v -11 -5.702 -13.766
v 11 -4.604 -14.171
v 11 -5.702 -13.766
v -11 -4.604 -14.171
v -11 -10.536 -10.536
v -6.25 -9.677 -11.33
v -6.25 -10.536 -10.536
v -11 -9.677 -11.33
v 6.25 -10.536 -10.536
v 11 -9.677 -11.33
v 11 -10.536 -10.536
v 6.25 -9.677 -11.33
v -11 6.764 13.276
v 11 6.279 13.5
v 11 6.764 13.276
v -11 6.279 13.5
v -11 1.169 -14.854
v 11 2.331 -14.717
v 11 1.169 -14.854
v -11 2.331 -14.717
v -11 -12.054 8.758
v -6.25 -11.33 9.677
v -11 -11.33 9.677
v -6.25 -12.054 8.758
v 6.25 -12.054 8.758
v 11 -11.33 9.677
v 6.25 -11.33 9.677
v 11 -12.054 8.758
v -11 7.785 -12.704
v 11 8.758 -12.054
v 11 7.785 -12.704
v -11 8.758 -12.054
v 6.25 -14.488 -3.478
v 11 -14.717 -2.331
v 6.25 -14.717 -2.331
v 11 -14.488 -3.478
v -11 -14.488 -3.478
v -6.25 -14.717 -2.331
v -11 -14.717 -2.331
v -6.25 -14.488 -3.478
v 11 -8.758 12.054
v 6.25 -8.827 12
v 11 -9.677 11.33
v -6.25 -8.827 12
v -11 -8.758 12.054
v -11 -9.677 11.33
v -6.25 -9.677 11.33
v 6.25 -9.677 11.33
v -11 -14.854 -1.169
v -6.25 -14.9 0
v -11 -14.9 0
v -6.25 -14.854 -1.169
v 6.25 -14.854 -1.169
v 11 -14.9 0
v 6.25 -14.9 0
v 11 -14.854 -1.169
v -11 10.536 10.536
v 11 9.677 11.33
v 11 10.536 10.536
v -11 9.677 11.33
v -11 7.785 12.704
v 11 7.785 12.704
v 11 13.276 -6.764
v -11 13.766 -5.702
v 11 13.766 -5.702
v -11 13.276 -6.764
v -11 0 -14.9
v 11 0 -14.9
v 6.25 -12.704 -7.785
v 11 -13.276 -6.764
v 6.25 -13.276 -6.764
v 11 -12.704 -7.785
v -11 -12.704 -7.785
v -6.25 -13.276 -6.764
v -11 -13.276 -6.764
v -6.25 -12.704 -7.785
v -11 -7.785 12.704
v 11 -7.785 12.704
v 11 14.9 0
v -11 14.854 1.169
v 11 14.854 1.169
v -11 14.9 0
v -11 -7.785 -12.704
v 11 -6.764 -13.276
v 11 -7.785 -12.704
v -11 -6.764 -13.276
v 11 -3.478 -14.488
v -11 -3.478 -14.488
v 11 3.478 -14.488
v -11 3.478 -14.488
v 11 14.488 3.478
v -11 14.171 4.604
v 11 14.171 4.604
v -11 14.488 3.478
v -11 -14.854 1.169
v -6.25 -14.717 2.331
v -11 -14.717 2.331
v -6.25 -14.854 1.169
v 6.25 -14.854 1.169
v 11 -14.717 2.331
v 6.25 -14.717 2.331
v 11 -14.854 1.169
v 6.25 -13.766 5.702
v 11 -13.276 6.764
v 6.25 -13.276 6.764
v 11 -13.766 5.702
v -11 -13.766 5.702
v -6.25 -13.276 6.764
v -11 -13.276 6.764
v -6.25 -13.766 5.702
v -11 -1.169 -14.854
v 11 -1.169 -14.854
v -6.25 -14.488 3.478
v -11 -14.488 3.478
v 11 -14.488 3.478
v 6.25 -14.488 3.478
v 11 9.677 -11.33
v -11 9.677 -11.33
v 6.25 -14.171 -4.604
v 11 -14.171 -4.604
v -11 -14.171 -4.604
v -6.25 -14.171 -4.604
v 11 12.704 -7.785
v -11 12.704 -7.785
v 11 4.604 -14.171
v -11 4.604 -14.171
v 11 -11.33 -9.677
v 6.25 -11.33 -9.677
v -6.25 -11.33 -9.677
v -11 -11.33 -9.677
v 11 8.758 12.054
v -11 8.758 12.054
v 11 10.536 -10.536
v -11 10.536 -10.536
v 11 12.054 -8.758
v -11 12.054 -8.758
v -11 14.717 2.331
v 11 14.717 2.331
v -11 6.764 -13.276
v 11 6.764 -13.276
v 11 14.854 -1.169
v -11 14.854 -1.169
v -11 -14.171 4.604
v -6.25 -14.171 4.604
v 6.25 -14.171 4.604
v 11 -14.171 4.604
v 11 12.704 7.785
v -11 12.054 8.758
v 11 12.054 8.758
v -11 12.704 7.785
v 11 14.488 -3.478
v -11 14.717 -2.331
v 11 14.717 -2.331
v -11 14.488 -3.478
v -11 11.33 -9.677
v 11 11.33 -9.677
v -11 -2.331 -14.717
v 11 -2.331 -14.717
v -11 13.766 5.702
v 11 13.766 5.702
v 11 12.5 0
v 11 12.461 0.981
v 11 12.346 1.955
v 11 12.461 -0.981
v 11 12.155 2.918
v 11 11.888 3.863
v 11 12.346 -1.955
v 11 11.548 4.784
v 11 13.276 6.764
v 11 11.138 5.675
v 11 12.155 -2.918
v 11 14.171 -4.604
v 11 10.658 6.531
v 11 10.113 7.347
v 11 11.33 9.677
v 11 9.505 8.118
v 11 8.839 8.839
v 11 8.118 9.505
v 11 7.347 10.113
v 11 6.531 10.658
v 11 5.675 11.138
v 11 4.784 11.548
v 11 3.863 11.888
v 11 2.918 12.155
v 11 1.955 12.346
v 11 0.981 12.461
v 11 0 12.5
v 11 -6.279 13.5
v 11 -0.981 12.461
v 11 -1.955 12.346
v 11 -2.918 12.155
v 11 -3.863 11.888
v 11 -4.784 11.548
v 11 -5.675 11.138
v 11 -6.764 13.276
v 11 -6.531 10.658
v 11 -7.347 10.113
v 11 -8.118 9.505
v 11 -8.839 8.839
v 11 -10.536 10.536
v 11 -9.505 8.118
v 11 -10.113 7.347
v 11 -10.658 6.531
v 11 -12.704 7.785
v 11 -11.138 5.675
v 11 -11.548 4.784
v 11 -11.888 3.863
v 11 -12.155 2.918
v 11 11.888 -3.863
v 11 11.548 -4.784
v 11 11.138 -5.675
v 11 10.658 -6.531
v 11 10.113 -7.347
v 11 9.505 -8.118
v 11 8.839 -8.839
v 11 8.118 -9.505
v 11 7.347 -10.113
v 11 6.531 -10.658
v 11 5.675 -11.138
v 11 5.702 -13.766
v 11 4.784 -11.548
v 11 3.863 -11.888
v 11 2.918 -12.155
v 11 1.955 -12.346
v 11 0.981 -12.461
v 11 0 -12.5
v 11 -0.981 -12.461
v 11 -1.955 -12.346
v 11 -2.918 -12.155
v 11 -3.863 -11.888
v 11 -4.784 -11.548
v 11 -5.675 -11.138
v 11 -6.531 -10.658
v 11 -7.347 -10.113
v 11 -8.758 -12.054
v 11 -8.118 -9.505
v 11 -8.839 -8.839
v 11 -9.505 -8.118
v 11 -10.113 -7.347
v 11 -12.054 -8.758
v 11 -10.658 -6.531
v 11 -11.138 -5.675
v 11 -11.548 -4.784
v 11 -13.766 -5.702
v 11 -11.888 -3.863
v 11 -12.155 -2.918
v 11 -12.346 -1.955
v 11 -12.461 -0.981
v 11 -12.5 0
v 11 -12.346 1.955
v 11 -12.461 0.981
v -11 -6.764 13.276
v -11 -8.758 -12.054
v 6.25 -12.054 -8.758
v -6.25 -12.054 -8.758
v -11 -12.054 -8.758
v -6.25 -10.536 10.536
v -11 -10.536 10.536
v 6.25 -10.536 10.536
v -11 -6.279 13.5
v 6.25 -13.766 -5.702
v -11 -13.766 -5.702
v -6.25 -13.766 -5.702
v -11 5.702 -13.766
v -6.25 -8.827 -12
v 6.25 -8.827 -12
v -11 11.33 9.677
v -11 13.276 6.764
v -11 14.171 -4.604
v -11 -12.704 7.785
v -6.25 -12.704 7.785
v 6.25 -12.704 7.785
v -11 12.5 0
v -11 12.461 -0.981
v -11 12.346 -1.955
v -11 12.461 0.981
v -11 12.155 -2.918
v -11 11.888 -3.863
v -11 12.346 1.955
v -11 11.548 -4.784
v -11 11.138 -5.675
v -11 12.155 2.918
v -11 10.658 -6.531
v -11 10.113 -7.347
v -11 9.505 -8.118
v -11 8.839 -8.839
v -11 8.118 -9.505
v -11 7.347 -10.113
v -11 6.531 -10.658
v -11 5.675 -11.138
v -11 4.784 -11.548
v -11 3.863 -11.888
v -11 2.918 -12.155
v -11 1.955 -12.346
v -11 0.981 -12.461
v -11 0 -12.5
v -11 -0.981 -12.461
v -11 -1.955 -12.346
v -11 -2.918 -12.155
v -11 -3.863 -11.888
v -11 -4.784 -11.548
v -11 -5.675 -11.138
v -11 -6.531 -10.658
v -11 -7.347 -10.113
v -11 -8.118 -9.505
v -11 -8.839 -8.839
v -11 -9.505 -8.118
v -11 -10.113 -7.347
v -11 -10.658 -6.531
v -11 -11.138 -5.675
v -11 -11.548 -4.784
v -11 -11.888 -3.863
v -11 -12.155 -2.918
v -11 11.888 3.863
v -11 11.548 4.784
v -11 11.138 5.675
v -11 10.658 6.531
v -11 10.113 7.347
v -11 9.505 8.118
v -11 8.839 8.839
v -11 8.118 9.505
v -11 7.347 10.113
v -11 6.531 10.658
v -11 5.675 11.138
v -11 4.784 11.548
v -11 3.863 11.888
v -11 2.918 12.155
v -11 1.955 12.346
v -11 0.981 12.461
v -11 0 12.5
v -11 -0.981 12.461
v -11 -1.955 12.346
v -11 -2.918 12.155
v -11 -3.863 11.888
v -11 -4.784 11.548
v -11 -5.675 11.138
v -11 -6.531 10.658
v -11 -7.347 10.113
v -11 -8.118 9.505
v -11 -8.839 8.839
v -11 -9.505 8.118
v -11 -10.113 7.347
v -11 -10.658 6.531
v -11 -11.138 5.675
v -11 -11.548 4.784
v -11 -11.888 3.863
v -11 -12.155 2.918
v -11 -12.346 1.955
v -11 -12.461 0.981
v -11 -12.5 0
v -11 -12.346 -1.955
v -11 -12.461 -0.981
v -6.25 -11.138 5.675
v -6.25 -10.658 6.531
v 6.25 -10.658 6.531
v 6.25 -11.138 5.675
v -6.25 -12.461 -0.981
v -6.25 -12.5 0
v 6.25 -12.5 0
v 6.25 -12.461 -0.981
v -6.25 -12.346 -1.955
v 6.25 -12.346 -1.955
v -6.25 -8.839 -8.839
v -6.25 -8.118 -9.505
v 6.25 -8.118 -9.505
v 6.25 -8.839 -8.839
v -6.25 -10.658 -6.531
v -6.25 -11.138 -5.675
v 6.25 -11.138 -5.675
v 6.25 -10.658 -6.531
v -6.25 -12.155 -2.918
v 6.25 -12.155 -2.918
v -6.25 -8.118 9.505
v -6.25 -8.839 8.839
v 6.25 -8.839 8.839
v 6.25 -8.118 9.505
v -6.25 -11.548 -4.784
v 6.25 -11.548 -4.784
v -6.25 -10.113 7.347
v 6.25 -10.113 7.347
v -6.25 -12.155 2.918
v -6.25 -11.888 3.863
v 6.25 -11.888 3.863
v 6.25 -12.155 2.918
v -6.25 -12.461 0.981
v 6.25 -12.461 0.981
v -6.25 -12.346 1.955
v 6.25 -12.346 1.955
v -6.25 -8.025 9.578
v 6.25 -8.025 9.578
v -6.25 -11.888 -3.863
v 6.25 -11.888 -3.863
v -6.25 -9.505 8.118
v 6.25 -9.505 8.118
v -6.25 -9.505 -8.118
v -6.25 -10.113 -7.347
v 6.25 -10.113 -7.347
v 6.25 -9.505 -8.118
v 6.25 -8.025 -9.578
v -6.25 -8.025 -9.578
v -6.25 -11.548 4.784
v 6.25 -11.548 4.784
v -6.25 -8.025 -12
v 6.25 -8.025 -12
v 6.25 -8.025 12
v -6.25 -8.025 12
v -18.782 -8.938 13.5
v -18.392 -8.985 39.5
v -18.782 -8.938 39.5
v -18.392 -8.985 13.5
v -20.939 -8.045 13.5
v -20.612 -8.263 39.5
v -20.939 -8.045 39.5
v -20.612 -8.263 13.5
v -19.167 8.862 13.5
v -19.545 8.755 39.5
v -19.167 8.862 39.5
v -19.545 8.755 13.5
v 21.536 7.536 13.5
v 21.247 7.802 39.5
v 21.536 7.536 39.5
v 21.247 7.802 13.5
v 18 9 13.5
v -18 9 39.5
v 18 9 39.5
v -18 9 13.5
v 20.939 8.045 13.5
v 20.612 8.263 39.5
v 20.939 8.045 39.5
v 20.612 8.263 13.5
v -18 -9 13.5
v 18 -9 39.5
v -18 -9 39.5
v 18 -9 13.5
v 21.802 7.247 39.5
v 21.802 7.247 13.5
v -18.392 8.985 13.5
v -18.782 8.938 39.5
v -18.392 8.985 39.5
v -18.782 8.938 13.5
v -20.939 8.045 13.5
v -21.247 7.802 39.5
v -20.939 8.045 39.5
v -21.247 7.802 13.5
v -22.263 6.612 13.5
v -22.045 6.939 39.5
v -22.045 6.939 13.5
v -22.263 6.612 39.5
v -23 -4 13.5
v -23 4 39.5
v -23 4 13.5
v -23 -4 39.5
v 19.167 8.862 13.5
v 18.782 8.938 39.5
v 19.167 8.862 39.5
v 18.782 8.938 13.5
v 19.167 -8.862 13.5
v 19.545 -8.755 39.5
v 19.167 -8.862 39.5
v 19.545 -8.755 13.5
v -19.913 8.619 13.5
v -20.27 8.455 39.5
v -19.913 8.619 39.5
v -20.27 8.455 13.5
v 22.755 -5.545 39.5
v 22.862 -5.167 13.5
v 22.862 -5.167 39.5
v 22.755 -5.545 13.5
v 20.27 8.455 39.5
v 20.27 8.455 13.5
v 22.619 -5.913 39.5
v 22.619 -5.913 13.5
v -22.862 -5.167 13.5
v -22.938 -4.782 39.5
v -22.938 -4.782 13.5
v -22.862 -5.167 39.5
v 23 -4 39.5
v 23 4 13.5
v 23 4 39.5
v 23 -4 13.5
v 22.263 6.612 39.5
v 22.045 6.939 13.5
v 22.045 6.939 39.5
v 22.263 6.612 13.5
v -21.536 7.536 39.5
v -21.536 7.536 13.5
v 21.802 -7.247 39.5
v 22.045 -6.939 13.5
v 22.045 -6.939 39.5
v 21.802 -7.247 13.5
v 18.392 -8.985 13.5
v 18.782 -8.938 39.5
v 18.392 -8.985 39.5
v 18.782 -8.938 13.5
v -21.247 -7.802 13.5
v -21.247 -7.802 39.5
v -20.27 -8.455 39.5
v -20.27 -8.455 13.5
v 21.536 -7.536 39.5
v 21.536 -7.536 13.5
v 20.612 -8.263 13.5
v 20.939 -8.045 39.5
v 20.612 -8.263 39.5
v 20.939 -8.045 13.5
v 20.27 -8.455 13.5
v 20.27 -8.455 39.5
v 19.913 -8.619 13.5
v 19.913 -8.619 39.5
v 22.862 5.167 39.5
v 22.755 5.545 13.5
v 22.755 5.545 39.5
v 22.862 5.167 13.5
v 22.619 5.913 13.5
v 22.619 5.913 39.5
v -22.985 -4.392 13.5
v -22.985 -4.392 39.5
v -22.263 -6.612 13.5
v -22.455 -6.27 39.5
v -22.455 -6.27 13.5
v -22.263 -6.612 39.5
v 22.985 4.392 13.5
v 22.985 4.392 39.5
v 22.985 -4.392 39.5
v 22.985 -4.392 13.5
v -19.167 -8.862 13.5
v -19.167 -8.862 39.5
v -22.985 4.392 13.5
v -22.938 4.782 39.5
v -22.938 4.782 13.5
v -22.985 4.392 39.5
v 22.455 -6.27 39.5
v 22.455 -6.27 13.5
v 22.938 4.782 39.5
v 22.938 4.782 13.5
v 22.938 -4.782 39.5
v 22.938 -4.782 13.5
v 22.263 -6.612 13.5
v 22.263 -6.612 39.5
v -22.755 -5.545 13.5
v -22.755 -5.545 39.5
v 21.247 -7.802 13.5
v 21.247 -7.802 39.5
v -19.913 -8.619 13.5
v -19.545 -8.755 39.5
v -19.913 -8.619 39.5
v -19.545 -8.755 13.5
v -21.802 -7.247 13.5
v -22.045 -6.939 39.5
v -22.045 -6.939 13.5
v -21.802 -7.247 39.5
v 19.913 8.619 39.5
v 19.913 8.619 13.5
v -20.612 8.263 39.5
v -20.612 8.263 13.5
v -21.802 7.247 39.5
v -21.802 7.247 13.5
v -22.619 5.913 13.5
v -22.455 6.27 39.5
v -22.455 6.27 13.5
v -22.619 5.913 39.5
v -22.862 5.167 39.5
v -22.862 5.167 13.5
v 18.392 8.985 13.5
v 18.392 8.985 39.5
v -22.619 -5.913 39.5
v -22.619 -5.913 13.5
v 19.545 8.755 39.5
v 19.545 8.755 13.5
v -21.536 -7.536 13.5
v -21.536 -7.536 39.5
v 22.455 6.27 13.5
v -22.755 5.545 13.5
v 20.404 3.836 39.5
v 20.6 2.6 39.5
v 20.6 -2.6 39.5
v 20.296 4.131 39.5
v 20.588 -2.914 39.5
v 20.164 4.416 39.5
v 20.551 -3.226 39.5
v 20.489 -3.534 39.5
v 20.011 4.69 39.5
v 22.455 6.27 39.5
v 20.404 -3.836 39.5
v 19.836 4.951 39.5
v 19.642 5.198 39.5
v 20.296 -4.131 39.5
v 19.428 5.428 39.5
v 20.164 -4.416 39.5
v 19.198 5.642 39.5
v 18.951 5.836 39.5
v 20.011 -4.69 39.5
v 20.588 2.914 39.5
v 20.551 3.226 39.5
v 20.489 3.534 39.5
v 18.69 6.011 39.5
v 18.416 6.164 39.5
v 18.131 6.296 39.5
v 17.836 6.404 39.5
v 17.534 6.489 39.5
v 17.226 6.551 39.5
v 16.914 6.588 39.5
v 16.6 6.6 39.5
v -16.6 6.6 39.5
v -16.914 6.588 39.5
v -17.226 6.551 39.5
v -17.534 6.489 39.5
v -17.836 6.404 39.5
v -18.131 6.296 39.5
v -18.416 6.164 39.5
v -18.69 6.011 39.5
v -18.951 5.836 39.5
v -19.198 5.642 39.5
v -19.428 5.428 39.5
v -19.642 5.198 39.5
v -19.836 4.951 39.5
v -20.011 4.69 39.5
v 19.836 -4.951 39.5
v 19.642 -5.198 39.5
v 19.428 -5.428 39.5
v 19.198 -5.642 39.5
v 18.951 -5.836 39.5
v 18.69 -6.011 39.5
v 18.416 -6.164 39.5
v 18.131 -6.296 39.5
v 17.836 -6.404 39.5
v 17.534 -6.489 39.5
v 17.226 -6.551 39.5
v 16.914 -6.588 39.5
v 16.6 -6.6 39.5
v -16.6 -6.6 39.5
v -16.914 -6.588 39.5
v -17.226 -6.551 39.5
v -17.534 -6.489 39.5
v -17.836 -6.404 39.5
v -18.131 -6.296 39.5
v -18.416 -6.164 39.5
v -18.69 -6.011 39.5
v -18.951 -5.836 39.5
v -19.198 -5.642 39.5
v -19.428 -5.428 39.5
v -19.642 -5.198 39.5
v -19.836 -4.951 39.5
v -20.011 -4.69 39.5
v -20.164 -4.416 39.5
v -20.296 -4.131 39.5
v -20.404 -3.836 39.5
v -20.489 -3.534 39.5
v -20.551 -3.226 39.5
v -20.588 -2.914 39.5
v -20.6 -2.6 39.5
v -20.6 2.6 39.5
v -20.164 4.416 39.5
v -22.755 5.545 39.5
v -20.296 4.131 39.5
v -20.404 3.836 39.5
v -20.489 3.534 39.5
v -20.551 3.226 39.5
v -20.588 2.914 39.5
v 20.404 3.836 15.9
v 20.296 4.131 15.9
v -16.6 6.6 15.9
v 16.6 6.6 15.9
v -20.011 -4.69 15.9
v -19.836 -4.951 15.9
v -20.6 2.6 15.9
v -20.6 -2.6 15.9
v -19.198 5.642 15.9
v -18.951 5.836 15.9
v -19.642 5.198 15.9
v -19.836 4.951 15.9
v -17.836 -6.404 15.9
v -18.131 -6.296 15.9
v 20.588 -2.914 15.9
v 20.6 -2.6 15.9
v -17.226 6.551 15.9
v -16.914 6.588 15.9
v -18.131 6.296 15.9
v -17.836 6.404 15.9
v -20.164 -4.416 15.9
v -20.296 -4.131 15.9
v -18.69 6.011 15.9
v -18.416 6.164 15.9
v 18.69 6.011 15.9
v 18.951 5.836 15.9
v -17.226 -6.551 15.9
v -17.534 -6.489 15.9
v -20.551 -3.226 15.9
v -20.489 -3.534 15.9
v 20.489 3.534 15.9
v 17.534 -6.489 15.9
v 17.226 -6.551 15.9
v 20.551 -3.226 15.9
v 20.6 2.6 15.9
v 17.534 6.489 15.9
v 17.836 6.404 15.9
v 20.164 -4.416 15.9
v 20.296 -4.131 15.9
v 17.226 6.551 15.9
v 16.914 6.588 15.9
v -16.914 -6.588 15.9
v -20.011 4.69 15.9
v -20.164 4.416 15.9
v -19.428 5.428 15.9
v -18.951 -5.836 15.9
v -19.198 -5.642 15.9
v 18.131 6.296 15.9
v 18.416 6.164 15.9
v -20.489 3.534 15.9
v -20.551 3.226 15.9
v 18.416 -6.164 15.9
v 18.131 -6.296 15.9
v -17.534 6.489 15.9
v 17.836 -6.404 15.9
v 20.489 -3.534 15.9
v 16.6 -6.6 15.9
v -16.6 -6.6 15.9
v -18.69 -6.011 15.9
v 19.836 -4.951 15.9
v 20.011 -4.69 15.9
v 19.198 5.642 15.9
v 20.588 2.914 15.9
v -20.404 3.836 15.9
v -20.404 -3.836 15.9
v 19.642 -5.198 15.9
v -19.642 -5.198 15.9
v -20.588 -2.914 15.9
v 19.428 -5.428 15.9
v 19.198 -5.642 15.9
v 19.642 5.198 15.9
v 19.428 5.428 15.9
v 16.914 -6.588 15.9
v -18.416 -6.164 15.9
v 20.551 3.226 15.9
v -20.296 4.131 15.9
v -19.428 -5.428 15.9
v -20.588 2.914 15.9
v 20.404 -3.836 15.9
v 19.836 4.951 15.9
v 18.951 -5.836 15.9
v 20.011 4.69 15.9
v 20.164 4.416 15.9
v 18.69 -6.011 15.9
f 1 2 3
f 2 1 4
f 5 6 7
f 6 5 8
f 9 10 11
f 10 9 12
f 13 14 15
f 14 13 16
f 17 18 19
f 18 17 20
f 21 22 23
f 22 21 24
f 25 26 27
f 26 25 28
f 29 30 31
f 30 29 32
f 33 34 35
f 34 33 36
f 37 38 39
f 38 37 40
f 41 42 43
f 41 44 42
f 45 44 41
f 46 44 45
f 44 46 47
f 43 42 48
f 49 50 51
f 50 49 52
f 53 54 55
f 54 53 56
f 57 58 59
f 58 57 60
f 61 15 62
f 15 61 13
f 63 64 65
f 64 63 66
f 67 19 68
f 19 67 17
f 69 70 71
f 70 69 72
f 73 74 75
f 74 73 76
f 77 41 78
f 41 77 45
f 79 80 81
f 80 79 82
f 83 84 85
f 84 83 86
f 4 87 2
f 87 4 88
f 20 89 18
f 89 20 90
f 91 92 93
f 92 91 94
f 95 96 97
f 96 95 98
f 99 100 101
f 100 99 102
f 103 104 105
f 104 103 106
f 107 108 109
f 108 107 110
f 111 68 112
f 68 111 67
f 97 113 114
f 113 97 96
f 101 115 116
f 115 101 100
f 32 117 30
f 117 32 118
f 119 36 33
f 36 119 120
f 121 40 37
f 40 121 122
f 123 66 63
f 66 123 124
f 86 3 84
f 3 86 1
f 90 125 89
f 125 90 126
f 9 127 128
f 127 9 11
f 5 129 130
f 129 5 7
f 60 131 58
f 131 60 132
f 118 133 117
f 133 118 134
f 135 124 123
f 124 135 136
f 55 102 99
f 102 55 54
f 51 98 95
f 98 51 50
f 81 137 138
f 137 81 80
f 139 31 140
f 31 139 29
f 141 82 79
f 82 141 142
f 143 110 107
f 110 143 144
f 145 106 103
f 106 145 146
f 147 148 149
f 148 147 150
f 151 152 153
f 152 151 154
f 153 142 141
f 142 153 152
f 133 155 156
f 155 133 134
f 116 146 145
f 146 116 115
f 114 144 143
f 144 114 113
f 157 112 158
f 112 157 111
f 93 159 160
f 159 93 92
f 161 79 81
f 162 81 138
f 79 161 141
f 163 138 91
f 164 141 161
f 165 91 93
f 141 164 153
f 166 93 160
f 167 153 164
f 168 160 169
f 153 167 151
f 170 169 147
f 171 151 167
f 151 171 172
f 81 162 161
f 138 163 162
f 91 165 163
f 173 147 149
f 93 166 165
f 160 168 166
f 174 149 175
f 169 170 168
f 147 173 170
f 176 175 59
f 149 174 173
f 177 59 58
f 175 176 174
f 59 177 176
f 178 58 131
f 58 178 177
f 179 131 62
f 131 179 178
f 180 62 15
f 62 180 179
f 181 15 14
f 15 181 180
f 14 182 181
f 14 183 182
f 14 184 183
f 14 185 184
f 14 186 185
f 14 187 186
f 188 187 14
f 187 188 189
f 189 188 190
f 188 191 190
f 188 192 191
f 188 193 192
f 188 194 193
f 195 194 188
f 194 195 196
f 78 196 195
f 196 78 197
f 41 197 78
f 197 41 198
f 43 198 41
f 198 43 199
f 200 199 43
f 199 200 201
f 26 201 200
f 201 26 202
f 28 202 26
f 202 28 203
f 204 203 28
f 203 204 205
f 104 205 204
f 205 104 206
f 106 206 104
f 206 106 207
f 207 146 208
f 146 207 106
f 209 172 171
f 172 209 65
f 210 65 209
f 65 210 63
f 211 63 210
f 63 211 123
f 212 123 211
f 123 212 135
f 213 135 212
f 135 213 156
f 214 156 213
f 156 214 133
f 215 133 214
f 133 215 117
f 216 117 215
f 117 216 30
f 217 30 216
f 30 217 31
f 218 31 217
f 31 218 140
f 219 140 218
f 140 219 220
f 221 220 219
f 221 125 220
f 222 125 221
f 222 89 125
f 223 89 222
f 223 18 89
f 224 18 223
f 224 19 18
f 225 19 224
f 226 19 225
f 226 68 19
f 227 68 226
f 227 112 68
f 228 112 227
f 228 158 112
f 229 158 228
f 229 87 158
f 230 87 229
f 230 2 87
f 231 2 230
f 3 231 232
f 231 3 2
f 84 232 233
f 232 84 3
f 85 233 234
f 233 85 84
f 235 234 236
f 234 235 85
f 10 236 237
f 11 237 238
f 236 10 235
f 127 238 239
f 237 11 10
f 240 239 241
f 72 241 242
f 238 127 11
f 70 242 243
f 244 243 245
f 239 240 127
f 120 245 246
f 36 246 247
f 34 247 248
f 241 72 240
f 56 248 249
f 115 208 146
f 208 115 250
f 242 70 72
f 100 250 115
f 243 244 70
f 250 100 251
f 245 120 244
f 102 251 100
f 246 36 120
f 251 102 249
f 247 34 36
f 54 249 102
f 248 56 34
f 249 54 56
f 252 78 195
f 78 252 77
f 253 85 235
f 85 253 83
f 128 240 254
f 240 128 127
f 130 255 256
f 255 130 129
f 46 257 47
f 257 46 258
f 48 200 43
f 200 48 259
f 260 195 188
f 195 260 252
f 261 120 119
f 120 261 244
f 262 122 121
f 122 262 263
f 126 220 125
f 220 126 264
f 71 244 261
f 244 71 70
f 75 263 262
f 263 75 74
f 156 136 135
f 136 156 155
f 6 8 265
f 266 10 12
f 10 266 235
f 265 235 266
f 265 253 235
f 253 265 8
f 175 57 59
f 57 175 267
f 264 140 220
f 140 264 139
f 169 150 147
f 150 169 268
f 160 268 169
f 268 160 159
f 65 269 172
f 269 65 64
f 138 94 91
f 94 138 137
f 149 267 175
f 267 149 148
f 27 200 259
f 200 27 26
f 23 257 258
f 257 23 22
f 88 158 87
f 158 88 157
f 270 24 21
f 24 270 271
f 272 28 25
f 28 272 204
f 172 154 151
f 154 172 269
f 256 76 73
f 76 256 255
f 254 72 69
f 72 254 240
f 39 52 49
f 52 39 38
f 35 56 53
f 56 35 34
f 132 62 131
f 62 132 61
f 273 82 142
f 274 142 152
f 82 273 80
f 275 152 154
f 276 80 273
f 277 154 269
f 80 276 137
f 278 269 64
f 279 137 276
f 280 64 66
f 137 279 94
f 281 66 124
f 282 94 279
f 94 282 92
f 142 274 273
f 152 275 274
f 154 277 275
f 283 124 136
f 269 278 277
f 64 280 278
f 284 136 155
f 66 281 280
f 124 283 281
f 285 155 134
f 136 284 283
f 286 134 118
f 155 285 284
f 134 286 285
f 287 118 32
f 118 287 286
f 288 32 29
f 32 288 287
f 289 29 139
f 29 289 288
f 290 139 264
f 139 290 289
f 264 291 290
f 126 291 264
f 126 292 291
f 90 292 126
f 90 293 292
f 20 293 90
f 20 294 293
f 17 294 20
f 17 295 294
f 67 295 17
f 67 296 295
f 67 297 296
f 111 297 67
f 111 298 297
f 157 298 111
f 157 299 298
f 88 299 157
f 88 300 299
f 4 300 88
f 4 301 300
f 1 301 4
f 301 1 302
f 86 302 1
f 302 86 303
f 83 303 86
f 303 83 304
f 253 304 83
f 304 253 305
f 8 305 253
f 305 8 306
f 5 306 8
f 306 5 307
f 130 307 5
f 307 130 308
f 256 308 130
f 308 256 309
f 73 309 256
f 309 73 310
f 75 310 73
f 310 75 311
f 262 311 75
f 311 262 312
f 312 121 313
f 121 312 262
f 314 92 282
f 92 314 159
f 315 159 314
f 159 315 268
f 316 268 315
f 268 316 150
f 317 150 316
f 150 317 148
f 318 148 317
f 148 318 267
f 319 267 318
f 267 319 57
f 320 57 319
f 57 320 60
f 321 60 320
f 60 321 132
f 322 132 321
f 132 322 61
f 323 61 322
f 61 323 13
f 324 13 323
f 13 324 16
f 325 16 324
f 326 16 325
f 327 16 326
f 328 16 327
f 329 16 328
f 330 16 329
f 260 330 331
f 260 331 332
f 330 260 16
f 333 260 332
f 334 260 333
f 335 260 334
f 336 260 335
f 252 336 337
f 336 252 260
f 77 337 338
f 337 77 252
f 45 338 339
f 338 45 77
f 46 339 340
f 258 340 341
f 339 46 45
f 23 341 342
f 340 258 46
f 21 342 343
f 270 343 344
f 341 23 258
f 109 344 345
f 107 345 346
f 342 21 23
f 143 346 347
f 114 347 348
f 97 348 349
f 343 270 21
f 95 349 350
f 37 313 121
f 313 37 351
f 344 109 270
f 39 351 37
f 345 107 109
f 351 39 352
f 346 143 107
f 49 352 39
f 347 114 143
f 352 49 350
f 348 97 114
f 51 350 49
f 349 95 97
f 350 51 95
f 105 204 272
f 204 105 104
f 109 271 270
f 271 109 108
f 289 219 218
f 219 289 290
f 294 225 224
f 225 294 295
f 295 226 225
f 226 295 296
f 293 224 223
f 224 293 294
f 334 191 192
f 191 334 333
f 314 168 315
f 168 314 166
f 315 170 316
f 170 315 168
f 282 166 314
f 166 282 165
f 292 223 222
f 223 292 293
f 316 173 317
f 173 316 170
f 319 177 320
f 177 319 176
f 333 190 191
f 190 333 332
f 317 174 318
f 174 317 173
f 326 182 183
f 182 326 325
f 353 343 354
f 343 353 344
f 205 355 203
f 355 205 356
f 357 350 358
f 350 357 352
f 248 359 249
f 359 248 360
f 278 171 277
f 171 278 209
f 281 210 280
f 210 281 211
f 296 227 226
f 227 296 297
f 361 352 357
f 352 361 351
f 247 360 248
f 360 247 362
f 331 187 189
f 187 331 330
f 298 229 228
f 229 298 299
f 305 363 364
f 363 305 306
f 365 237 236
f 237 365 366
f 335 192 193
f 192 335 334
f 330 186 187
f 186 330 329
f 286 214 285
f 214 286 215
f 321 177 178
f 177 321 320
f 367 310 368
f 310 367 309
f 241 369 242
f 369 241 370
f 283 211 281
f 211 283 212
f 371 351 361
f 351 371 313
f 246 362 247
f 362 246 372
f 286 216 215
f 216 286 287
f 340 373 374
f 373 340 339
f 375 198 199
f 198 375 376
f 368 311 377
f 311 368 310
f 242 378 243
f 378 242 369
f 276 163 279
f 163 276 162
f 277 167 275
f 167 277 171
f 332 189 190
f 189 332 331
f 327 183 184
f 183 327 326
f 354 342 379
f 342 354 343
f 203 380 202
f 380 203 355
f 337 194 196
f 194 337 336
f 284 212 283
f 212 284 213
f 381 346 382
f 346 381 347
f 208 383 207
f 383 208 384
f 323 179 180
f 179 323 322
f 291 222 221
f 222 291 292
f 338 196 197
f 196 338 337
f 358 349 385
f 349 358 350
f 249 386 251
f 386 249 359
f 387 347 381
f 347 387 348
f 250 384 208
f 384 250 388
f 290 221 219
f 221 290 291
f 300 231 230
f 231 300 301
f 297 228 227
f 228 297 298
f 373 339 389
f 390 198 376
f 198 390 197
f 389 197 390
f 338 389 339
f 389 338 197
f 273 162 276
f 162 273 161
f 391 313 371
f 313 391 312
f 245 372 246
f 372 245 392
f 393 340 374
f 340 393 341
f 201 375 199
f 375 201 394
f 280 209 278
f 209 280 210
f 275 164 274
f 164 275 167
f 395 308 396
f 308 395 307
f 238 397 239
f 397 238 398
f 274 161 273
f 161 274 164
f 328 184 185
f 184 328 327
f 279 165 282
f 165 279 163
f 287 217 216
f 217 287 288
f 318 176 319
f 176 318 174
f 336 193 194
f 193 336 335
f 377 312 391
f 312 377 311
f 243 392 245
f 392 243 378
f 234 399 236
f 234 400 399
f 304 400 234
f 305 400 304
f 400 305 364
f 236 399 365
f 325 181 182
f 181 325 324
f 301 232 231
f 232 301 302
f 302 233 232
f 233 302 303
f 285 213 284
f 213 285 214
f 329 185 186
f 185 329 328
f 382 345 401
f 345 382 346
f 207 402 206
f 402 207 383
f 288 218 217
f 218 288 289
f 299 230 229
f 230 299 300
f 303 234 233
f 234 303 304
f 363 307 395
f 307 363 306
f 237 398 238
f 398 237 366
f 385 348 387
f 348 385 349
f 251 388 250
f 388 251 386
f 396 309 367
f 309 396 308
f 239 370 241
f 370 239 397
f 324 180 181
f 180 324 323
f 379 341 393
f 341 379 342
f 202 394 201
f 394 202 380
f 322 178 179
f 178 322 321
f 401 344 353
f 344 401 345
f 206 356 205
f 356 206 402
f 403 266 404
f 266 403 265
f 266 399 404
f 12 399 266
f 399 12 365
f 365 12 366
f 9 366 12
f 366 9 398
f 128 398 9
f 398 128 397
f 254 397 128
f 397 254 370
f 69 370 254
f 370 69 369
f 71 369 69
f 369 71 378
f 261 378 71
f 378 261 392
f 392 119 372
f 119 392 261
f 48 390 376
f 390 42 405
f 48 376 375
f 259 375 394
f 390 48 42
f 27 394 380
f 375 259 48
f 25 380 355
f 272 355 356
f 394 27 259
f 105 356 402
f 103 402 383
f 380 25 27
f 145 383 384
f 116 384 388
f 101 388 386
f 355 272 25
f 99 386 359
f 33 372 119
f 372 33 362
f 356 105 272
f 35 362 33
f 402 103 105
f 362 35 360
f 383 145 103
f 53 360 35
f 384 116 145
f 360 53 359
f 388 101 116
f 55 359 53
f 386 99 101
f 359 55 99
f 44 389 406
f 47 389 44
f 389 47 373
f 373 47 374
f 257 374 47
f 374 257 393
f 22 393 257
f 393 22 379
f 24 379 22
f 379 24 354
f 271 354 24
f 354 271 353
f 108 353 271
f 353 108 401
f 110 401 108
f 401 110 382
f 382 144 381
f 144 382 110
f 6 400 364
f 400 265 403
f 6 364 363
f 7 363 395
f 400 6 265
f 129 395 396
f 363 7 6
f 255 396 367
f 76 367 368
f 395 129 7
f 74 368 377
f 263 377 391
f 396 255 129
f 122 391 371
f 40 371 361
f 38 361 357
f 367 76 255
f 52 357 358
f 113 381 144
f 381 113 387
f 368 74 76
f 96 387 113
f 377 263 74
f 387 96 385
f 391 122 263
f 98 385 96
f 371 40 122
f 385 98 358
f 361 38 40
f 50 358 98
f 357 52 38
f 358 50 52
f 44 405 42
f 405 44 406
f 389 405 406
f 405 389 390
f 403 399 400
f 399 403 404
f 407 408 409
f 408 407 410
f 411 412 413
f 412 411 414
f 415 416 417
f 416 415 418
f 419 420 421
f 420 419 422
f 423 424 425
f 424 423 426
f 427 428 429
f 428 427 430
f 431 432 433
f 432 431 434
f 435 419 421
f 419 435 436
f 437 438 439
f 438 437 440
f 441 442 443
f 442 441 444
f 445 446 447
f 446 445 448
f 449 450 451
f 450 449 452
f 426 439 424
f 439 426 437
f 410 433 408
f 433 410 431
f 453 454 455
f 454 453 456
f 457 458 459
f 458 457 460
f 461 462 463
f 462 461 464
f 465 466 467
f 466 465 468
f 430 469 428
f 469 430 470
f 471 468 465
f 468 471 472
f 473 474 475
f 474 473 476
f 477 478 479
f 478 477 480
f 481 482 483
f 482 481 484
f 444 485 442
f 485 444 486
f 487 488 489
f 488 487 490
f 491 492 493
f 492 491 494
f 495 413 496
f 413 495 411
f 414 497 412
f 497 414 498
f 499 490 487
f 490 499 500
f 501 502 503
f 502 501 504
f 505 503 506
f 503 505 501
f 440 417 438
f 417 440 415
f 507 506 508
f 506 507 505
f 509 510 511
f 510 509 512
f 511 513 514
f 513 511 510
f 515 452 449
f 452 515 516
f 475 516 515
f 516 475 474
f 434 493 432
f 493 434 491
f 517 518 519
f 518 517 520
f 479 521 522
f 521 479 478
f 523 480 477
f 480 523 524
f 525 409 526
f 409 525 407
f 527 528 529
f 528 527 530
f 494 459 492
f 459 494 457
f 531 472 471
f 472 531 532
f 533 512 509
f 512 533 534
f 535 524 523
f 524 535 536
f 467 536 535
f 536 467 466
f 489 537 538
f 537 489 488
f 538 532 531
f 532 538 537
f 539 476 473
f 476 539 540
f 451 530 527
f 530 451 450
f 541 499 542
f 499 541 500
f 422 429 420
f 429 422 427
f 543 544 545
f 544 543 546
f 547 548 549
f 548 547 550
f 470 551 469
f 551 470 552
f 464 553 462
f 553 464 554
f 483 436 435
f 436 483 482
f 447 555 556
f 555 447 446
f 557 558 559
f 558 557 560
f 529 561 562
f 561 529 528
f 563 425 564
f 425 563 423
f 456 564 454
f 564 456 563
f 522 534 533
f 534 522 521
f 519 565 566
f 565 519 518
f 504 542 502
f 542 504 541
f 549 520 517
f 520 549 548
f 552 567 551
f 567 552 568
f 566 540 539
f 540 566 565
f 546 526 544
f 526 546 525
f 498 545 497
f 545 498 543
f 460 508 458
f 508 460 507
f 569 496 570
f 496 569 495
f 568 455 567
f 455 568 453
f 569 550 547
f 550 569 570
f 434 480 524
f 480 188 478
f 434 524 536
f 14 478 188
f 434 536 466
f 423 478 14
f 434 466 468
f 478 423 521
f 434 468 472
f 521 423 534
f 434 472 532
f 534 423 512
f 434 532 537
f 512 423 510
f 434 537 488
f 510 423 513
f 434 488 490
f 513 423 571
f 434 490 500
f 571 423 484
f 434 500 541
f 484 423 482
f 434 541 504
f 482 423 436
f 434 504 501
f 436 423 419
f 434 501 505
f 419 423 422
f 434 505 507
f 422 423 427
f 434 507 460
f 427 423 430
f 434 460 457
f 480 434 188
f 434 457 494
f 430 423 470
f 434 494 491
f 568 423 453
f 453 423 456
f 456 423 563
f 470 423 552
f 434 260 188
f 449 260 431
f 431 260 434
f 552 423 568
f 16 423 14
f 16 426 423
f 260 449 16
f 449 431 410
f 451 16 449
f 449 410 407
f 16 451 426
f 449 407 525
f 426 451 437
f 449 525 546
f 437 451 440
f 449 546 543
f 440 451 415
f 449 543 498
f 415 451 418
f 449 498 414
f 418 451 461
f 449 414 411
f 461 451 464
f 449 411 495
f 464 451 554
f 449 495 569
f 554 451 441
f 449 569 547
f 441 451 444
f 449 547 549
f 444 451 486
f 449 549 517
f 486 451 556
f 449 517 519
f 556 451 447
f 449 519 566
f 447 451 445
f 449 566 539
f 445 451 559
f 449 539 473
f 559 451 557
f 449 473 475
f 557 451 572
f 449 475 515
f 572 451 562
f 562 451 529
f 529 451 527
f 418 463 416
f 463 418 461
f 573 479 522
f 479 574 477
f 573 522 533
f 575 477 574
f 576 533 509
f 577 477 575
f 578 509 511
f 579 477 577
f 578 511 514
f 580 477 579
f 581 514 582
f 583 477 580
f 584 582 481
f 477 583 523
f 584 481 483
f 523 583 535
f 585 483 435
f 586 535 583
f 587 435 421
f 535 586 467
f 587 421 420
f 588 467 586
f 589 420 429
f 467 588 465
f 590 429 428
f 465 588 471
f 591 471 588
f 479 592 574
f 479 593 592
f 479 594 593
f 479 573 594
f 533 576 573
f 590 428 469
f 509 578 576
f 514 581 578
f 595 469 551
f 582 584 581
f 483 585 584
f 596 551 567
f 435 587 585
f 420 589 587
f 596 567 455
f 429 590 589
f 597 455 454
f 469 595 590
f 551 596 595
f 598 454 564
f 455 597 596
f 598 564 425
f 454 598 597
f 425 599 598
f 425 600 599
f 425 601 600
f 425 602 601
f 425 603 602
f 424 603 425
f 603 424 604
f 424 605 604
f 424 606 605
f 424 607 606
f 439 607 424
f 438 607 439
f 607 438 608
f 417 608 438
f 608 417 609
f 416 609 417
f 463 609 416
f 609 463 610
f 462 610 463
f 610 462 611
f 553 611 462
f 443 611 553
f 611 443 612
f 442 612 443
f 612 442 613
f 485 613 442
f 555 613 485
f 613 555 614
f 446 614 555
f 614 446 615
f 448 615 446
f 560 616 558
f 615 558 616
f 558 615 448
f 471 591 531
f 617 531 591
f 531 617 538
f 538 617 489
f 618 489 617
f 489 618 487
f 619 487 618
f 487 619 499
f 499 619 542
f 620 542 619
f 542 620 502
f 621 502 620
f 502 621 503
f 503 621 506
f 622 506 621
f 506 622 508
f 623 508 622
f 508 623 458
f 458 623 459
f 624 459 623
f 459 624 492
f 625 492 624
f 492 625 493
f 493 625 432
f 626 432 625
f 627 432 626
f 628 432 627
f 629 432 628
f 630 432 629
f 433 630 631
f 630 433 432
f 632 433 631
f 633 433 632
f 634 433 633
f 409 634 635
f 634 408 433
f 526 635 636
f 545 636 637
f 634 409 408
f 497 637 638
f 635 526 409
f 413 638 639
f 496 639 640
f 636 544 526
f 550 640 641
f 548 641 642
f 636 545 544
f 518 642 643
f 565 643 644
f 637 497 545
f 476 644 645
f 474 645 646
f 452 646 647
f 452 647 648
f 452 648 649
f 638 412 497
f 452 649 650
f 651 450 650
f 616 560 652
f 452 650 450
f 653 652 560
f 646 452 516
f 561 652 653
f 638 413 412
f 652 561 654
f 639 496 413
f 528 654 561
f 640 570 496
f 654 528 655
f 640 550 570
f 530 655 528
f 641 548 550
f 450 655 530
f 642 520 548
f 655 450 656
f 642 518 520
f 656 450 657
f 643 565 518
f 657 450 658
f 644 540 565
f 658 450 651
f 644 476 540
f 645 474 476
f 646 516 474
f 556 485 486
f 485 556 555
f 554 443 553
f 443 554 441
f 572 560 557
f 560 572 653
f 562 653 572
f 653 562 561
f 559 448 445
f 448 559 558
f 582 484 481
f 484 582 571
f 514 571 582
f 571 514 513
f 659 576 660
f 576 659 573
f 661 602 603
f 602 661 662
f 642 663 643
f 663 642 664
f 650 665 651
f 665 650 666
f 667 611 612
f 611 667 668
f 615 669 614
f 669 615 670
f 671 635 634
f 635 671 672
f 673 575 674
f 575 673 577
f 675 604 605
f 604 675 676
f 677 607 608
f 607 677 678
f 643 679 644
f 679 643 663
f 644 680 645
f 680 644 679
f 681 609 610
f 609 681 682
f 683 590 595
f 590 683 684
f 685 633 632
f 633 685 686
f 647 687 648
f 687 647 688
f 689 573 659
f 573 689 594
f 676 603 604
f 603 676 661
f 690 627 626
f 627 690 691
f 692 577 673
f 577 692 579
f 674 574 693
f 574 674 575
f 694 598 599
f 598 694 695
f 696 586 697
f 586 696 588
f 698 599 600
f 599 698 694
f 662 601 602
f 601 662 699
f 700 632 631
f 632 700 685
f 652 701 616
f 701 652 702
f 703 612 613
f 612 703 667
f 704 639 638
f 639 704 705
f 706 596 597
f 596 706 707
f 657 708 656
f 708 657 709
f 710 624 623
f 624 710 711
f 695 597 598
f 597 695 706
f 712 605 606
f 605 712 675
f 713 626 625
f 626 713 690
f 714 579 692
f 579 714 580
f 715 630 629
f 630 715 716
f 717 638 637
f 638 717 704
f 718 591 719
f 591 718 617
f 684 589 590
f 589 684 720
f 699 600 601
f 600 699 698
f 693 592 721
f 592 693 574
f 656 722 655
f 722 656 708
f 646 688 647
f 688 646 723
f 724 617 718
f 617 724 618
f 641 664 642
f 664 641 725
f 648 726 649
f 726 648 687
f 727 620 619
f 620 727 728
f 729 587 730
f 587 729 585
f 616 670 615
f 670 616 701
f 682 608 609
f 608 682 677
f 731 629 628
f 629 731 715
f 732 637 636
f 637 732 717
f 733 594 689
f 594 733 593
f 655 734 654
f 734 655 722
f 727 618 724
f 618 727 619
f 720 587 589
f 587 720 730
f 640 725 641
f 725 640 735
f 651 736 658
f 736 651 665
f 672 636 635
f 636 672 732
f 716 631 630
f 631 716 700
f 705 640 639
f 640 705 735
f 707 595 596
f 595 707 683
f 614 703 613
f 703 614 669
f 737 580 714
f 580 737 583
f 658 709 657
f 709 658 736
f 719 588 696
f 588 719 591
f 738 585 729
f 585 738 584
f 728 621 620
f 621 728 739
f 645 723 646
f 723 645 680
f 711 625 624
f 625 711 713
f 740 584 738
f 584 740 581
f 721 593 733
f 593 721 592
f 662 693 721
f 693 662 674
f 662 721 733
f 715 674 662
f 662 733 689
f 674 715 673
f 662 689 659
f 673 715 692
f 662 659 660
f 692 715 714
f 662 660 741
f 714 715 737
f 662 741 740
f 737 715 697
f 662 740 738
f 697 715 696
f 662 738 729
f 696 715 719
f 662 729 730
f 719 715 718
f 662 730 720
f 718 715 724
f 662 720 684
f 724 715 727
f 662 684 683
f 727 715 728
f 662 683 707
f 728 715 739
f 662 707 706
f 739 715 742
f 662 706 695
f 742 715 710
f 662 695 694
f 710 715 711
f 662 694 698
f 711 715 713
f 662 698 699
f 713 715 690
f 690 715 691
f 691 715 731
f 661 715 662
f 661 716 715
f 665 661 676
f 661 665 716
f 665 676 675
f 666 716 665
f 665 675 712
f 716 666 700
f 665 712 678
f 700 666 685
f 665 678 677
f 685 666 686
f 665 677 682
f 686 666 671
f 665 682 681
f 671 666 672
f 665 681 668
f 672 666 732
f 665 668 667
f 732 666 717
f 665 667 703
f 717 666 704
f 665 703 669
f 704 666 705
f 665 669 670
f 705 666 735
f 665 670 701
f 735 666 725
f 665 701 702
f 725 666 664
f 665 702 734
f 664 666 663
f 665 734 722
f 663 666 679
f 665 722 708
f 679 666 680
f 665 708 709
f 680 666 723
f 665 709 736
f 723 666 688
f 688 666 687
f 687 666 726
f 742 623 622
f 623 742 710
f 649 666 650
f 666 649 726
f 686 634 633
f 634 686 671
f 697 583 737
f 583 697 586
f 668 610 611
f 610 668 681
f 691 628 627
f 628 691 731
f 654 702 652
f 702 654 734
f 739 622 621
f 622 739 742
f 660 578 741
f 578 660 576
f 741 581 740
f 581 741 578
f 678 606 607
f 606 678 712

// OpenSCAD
// EchoDrop - clip-on acoustic leak sensor (parametric 3D model, starter)
//
// How to get a detailed 3D model/render from this file:
//   1. Install OpenSCAD (free, openscad.org) and open this file.
//   2. Press F6 to render, then File > Export > Export as STL.
//   3. Open the STL in Blender (free) for a full material/lighting render,
//      or in Tinkercad / Fusion 360 to keep editing it.
// All sizes are in millimetres. Change the values below to reshape it.

$fn = 80;

pipe_d   = 25;    // outer diameter of the pipe it clips onto
wall     = 2.4;   // casing wall thickness
clip_len = 22;    // how much of the pipe length the clamp hugs

body_w   = 46;    // casing width
body_d   = 18;    // casing depth
body_h   = 26;    // casing height

module rbox(w, d, h, r) {
    hull() for (x = [-1, 1], y = [-1, 1])
        translate([x * (w/2 - r), y * (d/2 - r), 0]) cylinder(h = h, r = r);
}

module clamp() {                       // ring the pipe passes through, open underneath so it snaps on
    rotate([0, 90, 0])
    difference() {
        cylinder(h = clip_len, r = pipe_d/2 + wall, center = true);
        cylinder(h = clip_len + 2, r = pipe_d/2, center = true);
        translate([0, -(pipe_d/2 + wall), 0])
            cube([clip_len + 2, pipe_d * 0.55, pipe_d * 0.5], center = true);
    }
}

module body() {
    base_z = pipe_d/2 + 1;
    translate([0, 0, base_z])
    difference() {
        rbox(body_w, body_d, body_h, 5);
        translate([0, 0, wall]) rbox(body_w - 2*wall, body_d - 2*wall, body_h, 4);
        translate([body_w/2 - 9, 0, body_h - 1]) cylinder(h = 4, r = 2.4);   // LED port
    }
}

clamp();
body();
